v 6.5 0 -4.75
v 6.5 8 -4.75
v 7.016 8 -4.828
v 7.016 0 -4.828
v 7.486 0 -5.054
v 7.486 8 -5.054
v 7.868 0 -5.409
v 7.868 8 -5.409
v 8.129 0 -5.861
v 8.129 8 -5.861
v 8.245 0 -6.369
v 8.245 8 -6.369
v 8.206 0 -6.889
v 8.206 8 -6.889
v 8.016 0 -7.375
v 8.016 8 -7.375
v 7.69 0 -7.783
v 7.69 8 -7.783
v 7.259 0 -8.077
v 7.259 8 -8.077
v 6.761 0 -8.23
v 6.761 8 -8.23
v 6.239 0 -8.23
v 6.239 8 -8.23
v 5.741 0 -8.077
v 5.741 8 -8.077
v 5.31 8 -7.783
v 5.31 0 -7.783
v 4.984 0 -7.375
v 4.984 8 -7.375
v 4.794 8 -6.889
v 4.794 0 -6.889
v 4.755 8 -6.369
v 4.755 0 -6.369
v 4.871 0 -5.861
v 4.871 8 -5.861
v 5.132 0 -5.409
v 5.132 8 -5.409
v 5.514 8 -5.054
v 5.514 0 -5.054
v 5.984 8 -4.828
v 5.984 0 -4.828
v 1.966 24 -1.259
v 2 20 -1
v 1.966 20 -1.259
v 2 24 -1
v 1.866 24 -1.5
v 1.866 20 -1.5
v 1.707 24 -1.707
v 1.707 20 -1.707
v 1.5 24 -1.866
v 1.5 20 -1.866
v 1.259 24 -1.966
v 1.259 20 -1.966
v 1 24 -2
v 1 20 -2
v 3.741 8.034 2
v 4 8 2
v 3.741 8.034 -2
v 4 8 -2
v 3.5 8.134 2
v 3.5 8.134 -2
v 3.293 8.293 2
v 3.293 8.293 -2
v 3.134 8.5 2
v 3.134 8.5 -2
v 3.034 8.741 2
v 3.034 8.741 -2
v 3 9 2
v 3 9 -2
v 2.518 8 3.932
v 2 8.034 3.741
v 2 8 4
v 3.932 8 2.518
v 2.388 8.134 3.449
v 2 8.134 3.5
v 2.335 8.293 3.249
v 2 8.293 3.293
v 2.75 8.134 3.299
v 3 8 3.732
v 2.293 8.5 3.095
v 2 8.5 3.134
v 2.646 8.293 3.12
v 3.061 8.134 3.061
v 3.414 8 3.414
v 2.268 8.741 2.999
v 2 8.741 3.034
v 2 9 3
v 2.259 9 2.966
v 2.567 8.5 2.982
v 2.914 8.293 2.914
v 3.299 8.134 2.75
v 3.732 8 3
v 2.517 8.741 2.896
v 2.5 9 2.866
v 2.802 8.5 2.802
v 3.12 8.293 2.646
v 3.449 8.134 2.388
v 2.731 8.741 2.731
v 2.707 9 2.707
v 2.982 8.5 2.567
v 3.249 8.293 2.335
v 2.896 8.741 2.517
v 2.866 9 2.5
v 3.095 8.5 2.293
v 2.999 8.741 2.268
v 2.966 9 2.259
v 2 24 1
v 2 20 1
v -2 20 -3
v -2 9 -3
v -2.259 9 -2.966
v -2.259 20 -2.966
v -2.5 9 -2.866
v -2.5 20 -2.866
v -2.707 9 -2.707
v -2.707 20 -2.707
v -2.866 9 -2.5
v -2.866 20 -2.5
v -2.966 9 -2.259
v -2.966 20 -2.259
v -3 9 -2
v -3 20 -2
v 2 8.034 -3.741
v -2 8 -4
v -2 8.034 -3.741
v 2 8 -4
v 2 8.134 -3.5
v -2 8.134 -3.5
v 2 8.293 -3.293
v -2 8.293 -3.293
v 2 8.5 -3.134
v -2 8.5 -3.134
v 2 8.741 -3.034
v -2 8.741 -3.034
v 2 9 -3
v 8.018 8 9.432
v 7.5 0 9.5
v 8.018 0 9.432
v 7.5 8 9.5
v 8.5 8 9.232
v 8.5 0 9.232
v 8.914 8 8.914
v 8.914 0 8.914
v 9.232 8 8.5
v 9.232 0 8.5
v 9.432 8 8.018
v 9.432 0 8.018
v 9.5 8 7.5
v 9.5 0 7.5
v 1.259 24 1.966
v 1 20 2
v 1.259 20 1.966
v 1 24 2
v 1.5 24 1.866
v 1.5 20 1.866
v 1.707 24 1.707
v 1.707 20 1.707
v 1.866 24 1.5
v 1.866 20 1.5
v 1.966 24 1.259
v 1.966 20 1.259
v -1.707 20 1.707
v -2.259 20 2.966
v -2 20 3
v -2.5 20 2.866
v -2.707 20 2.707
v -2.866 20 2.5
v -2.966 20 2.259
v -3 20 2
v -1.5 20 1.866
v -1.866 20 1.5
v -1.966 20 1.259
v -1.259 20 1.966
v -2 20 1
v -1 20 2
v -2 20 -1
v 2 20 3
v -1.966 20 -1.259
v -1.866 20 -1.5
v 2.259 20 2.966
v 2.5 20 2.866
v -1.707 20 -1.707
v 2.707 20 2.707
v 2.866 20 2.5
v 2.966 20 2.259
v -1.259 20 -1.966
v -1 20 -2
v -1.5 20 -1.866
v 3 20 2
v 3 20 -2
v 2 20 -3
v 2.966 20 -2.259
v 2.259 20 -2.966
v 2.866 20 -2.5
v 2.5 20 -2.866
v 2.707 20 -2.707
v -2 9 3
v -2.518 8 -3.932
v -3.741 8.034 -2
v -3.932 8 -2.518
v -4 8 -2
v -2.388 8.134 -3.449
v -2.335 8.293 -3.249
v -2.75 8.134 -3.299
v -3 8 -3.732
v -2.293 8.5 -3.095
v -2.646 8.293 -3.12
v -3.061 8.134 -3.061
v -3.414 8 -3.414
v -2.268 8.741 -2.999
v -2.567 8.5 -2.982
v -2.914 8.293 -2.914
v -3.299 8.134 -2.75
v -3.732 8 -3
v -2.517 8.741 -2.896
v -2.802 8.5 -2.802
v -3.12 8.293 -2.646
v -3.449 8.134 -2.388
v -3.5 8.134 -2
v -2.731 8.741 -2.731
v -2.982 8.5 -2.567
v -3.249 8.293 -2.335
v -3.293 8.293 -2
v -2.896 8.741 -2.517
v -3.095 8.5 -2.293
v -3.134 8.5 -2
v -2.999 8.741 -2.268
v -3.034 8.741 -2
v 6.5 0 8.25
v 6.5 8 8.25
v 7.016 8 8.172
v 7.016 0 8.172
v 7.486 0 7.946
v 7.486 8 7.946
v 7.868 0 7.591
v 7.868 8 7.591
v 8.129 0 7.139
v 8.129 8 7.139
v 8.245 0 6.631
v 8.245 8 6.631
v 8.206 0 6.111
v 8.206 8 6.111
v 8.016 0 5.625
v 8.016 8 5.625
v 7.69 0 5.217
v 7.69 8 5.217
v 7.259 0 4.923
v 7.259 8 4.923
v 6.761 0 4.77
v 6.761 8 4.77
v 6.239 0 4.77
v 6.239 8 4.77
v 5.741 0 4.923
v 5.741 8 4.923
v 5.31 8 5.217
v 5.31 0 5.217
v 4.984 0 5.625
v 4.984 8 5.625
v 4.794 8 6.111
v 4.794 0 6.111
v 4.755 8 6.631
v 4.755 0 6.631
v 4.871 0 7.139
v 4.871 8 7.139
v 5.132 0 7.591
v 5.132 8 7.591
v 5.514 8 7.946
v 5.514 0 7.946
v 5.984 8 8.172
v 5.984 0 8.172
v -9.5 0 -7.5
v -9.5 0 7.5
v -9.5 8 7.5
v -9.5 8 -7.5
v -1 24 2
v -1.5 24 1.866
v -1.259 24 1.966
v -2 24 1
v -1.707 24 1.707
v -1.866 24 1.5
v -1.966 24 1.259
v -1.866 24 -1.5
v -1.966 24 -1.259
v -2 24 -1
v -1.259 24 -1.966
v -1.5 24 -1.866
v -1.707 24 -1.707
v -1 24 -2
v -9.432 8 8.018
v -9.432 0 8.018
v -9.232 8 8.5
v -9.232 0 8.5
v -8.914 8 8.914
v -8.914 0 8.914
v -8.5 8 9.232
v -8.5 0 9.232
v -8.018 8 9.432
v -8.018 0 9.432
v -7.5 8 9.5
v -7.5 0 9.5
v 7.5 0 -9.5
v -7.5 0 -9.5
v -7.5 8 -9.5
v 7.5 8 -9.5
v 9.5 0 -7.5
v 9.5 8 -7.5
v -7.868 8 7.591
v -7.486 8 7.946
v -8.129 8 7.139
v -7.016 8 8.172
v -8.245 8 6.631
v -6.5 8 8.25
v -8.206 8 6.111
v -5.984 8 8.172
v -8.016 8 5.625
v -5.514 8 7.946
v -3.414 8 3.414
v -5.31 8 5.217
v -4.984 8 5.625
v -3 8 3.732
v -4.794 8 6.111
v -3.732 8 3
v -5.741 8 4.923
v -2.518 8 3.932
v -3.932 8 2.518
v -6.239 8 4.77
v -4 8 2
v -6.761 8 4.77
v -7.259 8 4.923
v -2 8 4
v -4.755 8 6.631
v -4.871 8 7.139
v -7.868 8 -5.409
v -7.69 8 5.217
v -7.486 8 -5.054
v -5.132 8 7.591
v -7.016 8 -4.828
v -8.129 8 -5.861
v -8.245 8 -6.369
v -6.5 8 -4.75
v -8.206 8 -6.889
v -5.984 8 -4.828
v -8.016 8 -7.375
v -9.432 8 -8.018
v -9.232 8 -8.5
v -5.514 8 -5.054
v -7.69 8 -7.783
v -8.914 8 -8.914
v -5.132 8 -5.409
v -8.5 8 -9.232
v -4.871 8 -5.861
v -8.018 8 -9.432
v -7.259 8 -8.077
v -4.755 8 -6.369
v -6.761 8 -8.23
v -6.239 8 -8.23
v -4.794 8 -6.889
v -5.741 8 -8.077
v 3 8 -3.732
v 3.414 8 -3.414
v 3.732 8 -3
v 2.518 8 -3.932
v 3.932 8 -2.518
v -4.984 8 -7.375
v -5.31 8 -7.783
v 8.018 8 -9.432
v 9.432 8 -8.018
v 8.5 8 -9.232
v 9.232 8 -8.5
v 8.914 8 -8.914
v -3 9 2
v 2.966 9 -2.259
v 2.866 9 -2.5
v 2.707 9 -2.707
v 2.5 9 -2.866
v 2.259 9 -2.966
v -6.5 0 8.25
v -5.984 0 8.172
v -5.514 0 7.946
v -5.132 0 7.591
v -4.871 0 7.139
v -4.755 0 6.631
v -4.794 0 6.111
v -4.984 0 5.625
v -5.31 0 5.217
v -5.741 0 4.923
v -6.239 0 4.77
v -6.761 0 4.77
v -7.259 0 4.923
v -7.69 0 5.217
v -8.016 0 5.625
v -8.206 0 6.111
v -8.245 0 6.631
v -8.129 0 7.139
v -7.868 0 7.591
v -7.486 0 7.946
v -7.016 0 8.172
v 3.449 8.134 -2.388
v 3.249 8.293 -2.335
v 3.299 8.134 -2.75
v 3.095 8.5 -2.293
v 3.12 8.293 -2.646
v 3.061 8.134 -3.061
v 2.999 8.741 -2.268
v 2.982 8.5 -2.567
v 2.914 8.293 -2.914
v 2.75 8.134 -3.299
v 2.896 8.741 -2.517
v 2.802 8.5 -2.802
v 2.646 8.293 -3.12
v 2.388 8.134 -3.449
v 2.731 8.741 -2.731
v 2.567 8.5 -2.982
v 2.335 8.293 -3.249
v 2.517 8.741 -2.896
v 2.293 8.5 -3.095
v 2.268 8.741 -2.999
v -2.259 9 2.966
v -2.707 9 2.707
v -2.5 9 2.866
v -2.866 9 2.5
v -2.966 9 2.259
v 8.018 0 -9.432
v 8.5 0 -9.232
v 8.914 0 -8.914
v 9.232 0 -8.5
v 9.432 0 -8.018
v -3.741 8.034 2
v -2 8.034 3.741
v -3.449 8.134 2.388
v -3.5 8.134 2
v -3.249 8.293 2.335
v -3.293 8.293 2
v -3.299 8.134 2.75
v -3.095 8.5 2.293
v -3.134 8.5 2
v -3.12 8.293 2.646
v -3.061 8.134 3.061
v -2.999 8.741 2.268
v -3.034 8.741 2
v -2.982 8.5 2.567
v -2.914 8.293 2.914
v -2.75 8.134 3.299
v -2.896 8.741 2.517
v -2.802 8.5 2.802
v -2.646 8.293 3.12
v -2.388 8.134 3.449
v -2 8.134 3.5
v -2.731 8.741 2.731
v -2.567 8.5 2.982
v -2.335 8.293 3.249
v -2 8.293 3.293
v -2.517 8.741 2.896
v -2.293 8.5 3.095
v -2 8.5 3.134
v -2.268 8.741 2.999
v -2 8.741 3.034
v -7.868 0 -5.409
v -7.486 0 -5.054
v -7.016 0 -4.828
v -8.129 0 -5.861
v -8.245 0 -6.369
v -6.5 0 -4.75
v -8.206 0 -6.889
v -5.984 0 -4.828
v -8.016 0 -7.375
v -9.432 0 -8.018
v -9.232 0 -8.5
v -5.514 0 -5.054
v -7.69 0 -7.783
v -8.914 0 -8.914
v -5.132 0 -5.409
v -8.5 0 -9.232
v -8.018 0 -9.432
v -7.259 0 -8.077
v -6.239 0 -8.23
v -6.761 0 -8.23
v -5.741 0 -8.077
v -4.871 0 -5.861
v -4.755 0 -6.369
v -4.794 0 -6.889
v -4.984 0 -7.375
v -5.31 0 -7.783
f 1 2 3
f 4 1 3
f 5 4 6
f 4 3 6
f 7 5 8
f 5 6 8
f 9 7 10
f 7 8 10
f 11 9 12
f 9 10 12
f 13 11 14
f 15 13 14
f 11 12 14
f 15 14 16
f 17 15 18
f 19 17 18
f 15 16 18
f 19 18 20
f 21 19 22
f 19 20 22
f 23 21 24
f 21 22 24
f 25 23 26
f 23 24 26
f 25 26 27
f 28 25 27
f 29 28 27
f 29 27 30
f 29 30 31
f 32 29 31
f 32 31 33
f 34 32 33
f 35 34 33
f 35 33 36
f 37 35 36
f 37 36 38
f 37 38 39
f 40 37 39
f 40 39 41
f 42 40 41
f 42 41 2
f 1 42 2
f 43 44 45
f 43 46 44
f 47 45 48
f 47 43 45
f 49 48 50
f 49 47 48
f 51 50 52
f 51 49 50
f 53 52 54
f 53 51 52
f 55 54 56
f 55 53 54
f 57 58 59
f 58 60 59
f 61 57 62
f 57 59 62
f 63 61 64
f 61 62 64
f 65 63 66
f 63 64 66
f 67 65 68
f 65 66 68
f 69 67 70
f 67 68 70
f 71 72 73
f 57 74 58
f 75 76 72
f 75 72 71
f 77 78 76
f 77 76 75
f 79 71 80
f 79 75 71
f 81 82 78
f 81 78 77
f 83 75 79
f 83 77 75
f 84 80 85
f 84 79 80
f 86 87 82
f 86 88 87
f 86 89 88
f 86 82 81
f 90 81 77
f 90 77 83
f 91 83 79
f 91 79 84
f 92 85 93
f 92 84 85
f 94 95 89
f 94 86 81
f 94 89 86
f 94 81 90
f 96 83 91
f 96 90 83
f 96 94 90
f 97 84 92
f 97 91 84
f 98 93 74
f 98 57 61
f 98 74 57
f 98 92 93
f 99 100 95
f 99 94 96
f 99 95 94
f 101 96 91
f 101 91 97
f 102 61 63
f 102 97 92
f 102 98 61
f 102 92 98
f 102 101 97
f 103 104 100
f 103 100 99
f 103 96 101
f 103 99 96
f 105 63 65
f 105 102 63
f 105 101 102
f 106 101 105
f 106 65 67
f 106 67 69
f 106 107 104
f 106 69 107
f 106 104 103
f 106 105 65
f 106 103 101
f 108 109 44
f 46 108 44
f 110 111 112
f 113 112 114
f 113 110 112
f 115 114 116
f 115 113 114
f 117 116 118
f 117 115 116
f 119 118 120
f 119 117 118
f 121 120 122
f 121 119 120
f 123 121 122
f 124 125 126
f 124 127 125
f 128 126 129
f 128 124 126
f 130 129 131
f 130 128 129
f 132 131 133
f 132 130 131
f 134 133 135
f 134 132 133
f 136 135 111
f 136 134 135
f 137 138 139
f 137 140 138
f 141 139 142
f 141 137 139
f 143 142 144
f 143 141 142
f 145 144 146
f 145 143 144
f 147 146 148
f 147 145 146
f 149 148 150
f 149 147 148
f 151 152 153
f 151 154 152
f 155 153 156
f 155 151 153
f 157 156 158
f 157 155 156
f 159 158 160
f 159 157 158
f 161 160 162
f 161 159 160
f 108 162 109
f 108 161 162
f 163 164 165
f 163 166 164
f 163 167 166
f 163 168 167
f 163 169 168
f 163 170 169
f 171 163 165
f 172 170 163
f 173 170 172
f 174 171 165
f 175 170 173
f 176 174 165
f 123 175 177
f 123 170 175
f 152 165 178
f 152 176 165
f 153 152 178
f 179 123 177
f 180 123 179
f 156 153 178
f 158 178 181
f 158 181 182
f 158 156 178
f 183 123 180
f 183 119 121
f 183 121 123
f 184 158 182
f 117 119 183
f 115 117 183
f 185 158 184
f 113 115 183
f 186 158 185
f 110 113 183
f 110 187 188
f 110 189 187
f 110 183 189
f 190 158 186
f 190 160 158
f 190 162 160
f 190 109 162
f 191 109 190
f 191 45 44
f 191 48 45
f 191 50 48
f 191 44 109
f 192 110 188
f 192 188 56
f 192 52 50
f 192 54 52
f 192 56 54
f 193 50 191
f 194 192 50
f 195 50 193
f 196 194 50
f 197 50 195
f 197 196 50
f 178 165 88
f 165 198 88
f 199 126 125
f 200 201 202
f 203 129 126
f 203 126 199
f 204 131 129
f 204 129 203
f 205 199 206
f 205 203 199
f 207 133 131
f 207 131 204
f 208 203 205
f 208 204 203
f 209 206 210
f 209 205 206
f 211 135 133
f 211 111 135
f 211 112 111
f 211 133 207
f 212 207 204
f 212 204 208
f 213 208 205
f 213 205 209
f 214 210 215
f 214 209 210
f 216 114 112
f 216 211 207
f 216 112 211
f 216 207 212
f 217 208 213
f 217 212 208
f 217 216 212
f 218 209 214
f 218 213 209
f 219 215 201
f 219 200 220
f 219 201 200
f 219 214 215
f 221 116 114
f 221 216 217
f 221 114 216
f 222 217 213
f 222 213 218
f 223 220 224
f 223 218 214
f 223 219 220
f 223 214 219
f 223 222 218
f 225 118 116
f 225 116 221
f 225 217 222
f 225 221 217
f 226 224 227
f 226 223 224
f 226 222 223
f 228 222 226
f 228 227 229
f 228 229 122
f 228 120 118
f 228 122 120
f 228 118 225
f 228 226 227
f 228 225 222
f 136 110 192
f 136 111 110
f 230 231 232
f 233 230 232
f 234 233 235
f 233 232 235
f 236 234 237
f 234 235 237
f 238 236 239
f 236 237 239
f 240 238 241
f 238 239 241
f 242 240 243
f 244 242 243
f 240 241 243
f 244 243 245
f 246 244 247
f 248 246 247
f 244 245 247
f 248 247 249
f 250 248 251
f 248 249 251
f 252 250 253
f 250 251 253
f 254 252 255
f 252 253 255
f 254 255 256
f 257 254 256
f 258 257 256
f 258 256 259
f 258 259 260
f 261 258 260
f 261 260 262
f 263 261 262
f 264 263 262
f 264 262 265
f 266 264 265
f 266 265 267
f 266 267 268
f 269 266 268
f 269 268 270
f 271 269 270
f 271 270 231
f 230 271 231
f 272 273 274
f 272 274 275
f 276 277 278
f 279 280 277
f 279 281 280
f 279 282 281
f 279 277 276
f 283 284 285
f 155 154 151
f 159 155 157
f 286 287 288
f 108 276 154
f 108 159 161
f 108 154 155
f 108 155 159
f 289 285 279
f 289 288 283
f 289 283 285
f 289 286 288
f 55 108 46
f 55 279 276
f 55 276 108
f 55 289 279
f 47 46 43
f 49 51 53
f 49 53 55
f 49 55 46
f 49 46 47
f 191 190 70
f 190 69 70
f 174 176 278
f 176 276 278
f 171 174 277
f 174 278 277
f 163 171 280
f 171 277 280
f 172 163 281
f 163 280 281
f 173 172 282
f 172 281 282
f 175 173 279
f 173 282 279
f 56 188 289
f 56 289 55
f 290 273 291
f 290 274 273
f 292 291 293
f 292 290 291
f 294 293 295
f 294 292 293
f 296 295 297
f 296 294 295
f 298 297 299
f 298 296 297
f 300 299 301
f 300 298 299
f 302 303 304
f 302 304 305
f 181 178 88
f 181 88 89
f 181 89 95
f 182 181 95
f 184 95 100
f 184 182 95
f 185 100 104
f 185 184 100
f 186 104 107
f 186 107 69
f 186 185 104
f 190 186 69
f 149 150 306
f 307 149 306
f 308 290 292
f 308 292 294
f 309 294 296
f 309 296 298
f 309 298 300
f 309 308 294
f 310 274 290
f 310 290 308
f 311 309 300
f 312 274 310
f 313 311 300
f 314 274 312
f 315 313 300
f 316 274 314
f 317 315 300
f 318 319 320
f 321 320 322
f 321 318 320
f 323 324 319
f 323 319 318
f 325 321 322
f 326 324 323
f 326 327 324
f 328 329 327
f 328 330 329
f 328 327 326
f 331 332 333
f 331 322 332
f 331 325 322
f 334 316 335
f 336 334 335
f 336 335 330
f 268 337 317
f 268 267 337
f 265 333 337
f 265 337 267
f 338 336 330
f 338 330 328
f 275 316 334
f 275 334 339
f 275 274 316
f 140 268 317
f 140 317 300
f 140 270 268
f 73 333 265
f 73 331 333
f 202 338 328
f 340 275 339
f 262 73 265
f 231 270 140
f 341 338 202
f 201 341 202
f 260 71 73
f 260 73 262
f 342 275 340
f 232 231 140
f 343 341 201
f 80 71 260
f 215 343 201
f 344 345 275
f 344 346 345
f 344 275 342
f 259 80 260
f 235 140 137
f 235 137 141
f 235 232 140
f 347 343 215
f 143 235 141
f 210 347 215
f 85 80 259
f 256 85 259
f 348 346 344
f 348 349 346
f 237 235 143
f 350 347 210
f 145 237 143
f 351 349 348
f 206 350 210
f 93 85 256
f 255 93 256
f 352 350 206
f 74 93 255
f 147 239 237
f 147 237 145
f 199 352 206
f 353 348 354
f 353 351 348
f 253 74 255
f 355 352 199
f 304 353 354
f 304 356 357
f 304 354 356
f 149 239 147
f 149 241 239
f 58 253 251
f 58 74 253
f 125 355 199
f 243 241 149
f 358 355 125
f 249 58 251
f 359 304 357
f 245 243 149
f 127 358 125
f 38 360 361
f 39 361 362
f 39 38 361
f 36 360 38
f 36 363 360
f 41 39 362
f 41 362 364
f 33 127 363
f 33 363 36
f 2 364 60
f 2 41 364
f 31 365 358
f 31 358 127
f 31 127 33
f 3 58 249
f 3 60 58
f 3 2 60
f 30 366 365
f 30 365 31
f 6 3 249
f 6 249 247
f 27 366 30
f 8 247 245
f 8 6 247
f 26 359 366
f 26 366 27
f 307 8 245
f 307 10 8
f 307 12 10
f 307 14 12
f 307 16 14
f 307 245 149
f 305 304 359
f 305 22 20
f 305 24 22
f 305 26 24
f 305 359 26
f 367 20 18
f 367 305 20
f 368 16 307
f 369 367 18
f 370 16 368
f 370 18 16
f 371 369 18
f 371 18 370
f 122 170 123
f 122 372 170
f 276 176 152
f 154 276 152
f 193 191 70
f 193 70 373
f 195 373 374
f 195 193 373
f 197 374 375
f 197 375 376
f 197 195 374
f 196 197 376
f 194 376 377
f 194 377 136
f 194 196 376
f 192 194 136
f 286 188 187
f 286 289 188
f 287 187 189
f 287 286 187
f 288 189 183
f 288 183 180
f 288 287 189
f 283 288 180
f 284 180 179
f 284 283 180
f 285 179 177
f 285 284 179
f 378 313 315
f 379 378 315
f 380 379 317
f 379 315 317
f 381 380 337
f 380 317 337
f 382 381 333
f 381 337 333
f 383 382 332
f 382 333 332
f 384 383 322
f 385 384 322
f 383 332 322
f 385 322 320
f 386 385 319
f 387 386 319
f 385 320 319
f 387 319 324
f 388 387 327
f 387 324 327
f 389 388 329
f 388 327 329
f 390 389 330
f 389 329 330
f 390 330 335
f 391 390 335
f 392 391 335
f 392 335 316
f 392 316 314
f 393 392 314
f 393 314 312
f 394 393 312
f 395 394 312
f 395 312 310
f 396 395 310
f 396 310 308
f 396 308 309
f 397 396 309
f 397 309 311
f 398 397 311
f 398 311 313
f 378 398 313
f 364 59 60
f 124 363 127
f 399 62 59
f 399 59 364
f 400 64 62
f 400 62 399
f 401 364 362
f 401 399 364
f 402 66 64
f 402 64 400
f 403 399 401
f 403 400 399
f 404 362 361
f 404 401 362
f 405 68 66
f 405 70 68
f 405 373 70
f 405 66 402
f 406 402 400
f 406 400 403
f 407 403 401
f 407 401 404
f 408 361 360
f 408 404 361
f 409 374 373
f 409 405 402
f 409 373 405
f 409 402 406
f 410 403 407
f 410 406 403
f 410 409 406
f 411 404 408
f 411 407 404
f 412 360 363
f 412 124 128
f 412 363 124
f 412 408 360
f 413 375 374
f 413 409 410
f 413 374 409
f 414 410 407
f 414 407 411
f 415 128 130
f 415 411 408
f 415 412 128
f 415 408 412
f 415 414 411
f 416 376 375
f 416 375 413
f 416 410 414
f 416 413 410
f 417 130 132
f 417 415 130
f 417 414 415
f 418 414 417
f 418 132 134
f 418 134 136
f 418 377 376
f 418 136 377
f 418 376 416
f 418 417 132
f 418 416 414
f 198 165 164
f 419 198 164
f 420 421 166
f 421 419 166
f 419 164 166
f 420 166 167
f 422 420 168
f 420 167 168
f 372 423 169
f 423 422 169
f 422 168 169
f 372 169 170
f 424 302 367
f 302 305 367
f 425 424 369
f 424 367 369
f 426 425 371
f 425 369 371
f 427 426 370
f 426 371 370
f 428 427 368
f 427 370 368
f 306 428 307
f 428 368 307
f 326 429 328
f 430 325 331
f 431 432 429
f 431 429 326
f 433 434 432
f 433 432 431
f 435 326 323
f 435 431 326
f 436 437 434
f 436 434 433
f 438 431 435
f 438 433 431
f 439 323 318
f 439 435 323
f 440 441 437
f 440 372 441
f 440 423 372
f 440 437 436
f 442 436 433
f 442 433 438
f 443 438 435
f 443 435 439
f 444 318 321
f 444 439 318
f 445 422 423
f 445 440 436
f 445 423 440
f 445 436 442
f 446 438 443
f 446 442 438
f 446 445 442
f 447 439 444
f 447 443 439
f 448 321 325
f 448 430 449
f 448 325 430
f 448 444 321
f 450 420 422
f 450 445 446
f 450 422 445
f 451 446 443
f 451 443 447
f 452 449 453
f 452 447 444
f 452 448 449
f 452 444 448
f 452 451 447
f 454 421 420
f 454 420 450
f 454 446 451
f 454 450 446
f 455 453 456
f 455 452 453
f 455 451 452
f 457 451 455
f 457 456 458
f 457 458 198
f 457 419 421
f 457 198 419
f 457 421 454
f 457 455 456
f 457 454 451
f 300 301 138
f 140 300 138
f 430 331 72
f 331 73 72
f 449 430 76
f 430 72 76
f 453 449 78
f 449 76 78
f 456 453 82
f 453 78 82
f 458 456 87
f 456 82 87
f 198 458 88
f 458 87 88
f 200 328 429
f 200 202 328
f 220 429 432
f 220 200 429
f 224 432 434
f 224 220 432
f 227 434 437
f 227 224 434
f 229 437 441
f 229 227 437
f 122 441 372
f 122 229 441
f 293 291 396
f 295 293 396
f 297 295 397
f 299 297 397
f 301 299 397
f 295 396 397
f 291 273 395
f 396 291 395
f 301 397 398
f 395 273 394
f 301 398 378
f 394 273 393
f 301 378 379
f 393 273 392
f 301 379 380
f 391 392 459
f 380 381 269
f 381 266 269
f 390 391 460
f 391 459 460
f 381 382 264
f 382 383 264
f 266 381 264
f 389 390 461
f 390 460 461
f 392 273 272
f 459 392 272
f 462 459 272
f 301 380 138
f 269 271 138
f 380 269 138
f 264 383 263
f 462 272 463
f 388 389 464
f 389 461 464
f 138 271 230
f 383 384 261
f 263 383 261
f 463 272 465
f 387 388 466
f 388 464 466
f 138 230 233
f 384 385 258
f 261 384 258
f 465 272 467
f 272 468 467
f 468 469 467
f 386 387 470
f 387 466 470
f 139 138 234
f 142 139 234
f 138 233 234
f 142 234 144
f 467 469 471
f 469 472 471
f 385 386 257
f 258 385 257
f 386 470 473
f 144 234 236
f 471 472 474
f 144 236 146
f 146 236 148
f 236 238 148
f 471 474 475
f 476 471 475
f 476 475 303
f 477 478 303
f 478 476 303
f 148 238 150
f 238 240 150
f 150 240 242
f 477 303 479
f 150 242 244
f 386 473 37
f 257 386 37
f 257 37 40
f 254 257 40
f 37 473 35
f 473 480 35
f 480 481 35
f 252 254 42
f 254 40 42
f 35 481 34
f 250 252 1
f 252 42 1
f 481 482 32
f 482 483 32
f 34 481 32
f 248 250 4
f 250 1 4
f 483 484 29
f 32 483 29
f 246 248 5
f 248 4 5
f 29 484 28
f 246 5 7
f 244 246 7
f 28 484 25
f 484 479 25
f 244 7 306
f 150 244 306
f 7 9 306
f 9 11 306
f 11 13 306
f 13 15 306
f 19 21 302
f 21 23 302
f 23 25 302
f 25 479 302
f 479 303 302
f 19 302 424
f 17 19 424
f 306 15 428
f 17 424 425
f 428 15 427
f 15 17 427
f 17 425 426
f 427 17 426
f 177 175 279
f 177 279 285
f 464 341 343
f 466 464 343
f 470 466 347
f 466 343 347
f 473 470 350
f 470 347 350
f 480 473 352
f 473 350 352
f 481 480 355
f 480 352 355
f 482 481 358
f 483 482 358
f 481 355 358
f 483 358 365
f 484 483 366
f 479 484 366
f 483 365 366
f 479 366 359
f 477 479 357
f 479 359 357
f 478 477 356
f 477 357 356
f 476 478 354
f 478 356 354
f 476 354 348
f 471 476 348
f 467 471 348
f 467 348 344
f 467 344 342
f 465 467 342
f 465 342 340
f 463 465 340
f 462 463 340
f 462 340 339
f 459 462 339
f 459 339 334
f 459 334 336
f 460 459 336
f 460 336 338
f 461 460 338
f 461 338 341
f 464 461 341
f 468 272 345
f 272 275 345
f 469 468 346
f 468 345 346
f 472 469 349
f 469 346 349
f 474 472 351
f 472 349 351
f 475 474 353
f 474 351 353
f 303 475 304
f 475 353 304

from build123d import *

# Parameters (mm, degrees)
SKETCH1_W           = 19
SKETCH1_H           = 19
BOSS_EXTRUDE1_DEPTH = 8
SKETCH2_R           = 1.75
CUT_EXTRUDE1_DEPTH  = 16.636495771
SKETCH3_W           = 6
SKETCH3_H           = 6
BOSS_EXTRUDE2_DEPTH = 12
FILLET1_R           = 2
SKETCH5_W           = 4
SKETCH5_H           = 4
BOSS_EXTRUDE4_DEPTH = 4
FILLET3_R           = 1


with BuildPart() as part:
    # Sketch1 → Boss-Extrude1 (new body)
    with BuildSketch(Plane(origin=(0, 0, 0), x_dir=(1, 0, 0), z_dir=(0, 1, 0))):
        Rectangle(SKETCH1_W, SKETCH1_H)
    extrude(amount=BOSS_EXTRUDE1_DEPTH)

    # Sketch2 → Cut-Extrude1 (cut, through all)
    with BuildSketch(Plane(origin=(0, 8, 0), x_dir=(1, 0, 0), z_dir=(0, 1, 0))):
        with Locations(Location((-6.5, 6.5, 0), (0, 0, 270))):
            Circle(SKETCH2_R)
        with Locations(Location((6.5, 6.5, 0), (0, 0, 270))):
            Circle(SKETCH2_R)
        with Locations(Location((-6.5, -6.5, 0), (0, 0, 270))):
            Circle(SKETCH2_R)
        with Locations(Location((6.5, -6.5, 0), (0, 0, 270))):
            Circle(SKETCH2_R)
    extrude(amount=-CUT_EXTRUDE1_DEPTH, mode=Mode.SUBTRACT)

    # Sketch3 → Boss-Extrude2 (add)
    with BuildSketch(Plane(origin=(0, 8, 0), x_dir=(1, 0, 0), z_dir=(0, 1, 0))):
        Rectangle(SKETCH3_W, SKETCH3_H)
    extrude(amount=BOSS_EXTRUDE2_DEPTH)

    # Fillet1
    fillet1_edges = [part.edges().sort_by_distance(p)[0] for p in [
        (-9.5, 4, -9.5),
        (9.5, 4, -9.5),
        (9.5, 4, 9.5),
        (-9.5, 4, 9.5),
    ]]
    fillet(fillet1_edges, radius=FILLET1_R)

    # Sketch5 → Boss-Extrude4 (add)
    with BuildSketch(Plane(origin=(0, 20, 0), x_dir=(1, 0, 0), z_dir=(0, 1, 0))):
        Rectangle(SKETCH5_W, SKETCH5_H)
    extrude(amount=BOSS_EXTRUDE4_DEPTH)

    # Fillet3
    fillet3_edges = [part.edges().sort_by_distance(p)[0] for p in [
        (-3, 8, 0),
        (-3, 14, -3),
        (0, 8, 3),
        (-3, 14, 3),
        (3, 8, 0),
        (3, 14, 3),
        (0, 8, -3),
        (3, 14, -3),
        (-2, 22, -2),
        (-2, 22, 2),
        (2, 22, 2),
        (2, 22, -2),
    ]]
    fillet(fillet3_edges, radius=FILLET3_R)


solid = part.part
